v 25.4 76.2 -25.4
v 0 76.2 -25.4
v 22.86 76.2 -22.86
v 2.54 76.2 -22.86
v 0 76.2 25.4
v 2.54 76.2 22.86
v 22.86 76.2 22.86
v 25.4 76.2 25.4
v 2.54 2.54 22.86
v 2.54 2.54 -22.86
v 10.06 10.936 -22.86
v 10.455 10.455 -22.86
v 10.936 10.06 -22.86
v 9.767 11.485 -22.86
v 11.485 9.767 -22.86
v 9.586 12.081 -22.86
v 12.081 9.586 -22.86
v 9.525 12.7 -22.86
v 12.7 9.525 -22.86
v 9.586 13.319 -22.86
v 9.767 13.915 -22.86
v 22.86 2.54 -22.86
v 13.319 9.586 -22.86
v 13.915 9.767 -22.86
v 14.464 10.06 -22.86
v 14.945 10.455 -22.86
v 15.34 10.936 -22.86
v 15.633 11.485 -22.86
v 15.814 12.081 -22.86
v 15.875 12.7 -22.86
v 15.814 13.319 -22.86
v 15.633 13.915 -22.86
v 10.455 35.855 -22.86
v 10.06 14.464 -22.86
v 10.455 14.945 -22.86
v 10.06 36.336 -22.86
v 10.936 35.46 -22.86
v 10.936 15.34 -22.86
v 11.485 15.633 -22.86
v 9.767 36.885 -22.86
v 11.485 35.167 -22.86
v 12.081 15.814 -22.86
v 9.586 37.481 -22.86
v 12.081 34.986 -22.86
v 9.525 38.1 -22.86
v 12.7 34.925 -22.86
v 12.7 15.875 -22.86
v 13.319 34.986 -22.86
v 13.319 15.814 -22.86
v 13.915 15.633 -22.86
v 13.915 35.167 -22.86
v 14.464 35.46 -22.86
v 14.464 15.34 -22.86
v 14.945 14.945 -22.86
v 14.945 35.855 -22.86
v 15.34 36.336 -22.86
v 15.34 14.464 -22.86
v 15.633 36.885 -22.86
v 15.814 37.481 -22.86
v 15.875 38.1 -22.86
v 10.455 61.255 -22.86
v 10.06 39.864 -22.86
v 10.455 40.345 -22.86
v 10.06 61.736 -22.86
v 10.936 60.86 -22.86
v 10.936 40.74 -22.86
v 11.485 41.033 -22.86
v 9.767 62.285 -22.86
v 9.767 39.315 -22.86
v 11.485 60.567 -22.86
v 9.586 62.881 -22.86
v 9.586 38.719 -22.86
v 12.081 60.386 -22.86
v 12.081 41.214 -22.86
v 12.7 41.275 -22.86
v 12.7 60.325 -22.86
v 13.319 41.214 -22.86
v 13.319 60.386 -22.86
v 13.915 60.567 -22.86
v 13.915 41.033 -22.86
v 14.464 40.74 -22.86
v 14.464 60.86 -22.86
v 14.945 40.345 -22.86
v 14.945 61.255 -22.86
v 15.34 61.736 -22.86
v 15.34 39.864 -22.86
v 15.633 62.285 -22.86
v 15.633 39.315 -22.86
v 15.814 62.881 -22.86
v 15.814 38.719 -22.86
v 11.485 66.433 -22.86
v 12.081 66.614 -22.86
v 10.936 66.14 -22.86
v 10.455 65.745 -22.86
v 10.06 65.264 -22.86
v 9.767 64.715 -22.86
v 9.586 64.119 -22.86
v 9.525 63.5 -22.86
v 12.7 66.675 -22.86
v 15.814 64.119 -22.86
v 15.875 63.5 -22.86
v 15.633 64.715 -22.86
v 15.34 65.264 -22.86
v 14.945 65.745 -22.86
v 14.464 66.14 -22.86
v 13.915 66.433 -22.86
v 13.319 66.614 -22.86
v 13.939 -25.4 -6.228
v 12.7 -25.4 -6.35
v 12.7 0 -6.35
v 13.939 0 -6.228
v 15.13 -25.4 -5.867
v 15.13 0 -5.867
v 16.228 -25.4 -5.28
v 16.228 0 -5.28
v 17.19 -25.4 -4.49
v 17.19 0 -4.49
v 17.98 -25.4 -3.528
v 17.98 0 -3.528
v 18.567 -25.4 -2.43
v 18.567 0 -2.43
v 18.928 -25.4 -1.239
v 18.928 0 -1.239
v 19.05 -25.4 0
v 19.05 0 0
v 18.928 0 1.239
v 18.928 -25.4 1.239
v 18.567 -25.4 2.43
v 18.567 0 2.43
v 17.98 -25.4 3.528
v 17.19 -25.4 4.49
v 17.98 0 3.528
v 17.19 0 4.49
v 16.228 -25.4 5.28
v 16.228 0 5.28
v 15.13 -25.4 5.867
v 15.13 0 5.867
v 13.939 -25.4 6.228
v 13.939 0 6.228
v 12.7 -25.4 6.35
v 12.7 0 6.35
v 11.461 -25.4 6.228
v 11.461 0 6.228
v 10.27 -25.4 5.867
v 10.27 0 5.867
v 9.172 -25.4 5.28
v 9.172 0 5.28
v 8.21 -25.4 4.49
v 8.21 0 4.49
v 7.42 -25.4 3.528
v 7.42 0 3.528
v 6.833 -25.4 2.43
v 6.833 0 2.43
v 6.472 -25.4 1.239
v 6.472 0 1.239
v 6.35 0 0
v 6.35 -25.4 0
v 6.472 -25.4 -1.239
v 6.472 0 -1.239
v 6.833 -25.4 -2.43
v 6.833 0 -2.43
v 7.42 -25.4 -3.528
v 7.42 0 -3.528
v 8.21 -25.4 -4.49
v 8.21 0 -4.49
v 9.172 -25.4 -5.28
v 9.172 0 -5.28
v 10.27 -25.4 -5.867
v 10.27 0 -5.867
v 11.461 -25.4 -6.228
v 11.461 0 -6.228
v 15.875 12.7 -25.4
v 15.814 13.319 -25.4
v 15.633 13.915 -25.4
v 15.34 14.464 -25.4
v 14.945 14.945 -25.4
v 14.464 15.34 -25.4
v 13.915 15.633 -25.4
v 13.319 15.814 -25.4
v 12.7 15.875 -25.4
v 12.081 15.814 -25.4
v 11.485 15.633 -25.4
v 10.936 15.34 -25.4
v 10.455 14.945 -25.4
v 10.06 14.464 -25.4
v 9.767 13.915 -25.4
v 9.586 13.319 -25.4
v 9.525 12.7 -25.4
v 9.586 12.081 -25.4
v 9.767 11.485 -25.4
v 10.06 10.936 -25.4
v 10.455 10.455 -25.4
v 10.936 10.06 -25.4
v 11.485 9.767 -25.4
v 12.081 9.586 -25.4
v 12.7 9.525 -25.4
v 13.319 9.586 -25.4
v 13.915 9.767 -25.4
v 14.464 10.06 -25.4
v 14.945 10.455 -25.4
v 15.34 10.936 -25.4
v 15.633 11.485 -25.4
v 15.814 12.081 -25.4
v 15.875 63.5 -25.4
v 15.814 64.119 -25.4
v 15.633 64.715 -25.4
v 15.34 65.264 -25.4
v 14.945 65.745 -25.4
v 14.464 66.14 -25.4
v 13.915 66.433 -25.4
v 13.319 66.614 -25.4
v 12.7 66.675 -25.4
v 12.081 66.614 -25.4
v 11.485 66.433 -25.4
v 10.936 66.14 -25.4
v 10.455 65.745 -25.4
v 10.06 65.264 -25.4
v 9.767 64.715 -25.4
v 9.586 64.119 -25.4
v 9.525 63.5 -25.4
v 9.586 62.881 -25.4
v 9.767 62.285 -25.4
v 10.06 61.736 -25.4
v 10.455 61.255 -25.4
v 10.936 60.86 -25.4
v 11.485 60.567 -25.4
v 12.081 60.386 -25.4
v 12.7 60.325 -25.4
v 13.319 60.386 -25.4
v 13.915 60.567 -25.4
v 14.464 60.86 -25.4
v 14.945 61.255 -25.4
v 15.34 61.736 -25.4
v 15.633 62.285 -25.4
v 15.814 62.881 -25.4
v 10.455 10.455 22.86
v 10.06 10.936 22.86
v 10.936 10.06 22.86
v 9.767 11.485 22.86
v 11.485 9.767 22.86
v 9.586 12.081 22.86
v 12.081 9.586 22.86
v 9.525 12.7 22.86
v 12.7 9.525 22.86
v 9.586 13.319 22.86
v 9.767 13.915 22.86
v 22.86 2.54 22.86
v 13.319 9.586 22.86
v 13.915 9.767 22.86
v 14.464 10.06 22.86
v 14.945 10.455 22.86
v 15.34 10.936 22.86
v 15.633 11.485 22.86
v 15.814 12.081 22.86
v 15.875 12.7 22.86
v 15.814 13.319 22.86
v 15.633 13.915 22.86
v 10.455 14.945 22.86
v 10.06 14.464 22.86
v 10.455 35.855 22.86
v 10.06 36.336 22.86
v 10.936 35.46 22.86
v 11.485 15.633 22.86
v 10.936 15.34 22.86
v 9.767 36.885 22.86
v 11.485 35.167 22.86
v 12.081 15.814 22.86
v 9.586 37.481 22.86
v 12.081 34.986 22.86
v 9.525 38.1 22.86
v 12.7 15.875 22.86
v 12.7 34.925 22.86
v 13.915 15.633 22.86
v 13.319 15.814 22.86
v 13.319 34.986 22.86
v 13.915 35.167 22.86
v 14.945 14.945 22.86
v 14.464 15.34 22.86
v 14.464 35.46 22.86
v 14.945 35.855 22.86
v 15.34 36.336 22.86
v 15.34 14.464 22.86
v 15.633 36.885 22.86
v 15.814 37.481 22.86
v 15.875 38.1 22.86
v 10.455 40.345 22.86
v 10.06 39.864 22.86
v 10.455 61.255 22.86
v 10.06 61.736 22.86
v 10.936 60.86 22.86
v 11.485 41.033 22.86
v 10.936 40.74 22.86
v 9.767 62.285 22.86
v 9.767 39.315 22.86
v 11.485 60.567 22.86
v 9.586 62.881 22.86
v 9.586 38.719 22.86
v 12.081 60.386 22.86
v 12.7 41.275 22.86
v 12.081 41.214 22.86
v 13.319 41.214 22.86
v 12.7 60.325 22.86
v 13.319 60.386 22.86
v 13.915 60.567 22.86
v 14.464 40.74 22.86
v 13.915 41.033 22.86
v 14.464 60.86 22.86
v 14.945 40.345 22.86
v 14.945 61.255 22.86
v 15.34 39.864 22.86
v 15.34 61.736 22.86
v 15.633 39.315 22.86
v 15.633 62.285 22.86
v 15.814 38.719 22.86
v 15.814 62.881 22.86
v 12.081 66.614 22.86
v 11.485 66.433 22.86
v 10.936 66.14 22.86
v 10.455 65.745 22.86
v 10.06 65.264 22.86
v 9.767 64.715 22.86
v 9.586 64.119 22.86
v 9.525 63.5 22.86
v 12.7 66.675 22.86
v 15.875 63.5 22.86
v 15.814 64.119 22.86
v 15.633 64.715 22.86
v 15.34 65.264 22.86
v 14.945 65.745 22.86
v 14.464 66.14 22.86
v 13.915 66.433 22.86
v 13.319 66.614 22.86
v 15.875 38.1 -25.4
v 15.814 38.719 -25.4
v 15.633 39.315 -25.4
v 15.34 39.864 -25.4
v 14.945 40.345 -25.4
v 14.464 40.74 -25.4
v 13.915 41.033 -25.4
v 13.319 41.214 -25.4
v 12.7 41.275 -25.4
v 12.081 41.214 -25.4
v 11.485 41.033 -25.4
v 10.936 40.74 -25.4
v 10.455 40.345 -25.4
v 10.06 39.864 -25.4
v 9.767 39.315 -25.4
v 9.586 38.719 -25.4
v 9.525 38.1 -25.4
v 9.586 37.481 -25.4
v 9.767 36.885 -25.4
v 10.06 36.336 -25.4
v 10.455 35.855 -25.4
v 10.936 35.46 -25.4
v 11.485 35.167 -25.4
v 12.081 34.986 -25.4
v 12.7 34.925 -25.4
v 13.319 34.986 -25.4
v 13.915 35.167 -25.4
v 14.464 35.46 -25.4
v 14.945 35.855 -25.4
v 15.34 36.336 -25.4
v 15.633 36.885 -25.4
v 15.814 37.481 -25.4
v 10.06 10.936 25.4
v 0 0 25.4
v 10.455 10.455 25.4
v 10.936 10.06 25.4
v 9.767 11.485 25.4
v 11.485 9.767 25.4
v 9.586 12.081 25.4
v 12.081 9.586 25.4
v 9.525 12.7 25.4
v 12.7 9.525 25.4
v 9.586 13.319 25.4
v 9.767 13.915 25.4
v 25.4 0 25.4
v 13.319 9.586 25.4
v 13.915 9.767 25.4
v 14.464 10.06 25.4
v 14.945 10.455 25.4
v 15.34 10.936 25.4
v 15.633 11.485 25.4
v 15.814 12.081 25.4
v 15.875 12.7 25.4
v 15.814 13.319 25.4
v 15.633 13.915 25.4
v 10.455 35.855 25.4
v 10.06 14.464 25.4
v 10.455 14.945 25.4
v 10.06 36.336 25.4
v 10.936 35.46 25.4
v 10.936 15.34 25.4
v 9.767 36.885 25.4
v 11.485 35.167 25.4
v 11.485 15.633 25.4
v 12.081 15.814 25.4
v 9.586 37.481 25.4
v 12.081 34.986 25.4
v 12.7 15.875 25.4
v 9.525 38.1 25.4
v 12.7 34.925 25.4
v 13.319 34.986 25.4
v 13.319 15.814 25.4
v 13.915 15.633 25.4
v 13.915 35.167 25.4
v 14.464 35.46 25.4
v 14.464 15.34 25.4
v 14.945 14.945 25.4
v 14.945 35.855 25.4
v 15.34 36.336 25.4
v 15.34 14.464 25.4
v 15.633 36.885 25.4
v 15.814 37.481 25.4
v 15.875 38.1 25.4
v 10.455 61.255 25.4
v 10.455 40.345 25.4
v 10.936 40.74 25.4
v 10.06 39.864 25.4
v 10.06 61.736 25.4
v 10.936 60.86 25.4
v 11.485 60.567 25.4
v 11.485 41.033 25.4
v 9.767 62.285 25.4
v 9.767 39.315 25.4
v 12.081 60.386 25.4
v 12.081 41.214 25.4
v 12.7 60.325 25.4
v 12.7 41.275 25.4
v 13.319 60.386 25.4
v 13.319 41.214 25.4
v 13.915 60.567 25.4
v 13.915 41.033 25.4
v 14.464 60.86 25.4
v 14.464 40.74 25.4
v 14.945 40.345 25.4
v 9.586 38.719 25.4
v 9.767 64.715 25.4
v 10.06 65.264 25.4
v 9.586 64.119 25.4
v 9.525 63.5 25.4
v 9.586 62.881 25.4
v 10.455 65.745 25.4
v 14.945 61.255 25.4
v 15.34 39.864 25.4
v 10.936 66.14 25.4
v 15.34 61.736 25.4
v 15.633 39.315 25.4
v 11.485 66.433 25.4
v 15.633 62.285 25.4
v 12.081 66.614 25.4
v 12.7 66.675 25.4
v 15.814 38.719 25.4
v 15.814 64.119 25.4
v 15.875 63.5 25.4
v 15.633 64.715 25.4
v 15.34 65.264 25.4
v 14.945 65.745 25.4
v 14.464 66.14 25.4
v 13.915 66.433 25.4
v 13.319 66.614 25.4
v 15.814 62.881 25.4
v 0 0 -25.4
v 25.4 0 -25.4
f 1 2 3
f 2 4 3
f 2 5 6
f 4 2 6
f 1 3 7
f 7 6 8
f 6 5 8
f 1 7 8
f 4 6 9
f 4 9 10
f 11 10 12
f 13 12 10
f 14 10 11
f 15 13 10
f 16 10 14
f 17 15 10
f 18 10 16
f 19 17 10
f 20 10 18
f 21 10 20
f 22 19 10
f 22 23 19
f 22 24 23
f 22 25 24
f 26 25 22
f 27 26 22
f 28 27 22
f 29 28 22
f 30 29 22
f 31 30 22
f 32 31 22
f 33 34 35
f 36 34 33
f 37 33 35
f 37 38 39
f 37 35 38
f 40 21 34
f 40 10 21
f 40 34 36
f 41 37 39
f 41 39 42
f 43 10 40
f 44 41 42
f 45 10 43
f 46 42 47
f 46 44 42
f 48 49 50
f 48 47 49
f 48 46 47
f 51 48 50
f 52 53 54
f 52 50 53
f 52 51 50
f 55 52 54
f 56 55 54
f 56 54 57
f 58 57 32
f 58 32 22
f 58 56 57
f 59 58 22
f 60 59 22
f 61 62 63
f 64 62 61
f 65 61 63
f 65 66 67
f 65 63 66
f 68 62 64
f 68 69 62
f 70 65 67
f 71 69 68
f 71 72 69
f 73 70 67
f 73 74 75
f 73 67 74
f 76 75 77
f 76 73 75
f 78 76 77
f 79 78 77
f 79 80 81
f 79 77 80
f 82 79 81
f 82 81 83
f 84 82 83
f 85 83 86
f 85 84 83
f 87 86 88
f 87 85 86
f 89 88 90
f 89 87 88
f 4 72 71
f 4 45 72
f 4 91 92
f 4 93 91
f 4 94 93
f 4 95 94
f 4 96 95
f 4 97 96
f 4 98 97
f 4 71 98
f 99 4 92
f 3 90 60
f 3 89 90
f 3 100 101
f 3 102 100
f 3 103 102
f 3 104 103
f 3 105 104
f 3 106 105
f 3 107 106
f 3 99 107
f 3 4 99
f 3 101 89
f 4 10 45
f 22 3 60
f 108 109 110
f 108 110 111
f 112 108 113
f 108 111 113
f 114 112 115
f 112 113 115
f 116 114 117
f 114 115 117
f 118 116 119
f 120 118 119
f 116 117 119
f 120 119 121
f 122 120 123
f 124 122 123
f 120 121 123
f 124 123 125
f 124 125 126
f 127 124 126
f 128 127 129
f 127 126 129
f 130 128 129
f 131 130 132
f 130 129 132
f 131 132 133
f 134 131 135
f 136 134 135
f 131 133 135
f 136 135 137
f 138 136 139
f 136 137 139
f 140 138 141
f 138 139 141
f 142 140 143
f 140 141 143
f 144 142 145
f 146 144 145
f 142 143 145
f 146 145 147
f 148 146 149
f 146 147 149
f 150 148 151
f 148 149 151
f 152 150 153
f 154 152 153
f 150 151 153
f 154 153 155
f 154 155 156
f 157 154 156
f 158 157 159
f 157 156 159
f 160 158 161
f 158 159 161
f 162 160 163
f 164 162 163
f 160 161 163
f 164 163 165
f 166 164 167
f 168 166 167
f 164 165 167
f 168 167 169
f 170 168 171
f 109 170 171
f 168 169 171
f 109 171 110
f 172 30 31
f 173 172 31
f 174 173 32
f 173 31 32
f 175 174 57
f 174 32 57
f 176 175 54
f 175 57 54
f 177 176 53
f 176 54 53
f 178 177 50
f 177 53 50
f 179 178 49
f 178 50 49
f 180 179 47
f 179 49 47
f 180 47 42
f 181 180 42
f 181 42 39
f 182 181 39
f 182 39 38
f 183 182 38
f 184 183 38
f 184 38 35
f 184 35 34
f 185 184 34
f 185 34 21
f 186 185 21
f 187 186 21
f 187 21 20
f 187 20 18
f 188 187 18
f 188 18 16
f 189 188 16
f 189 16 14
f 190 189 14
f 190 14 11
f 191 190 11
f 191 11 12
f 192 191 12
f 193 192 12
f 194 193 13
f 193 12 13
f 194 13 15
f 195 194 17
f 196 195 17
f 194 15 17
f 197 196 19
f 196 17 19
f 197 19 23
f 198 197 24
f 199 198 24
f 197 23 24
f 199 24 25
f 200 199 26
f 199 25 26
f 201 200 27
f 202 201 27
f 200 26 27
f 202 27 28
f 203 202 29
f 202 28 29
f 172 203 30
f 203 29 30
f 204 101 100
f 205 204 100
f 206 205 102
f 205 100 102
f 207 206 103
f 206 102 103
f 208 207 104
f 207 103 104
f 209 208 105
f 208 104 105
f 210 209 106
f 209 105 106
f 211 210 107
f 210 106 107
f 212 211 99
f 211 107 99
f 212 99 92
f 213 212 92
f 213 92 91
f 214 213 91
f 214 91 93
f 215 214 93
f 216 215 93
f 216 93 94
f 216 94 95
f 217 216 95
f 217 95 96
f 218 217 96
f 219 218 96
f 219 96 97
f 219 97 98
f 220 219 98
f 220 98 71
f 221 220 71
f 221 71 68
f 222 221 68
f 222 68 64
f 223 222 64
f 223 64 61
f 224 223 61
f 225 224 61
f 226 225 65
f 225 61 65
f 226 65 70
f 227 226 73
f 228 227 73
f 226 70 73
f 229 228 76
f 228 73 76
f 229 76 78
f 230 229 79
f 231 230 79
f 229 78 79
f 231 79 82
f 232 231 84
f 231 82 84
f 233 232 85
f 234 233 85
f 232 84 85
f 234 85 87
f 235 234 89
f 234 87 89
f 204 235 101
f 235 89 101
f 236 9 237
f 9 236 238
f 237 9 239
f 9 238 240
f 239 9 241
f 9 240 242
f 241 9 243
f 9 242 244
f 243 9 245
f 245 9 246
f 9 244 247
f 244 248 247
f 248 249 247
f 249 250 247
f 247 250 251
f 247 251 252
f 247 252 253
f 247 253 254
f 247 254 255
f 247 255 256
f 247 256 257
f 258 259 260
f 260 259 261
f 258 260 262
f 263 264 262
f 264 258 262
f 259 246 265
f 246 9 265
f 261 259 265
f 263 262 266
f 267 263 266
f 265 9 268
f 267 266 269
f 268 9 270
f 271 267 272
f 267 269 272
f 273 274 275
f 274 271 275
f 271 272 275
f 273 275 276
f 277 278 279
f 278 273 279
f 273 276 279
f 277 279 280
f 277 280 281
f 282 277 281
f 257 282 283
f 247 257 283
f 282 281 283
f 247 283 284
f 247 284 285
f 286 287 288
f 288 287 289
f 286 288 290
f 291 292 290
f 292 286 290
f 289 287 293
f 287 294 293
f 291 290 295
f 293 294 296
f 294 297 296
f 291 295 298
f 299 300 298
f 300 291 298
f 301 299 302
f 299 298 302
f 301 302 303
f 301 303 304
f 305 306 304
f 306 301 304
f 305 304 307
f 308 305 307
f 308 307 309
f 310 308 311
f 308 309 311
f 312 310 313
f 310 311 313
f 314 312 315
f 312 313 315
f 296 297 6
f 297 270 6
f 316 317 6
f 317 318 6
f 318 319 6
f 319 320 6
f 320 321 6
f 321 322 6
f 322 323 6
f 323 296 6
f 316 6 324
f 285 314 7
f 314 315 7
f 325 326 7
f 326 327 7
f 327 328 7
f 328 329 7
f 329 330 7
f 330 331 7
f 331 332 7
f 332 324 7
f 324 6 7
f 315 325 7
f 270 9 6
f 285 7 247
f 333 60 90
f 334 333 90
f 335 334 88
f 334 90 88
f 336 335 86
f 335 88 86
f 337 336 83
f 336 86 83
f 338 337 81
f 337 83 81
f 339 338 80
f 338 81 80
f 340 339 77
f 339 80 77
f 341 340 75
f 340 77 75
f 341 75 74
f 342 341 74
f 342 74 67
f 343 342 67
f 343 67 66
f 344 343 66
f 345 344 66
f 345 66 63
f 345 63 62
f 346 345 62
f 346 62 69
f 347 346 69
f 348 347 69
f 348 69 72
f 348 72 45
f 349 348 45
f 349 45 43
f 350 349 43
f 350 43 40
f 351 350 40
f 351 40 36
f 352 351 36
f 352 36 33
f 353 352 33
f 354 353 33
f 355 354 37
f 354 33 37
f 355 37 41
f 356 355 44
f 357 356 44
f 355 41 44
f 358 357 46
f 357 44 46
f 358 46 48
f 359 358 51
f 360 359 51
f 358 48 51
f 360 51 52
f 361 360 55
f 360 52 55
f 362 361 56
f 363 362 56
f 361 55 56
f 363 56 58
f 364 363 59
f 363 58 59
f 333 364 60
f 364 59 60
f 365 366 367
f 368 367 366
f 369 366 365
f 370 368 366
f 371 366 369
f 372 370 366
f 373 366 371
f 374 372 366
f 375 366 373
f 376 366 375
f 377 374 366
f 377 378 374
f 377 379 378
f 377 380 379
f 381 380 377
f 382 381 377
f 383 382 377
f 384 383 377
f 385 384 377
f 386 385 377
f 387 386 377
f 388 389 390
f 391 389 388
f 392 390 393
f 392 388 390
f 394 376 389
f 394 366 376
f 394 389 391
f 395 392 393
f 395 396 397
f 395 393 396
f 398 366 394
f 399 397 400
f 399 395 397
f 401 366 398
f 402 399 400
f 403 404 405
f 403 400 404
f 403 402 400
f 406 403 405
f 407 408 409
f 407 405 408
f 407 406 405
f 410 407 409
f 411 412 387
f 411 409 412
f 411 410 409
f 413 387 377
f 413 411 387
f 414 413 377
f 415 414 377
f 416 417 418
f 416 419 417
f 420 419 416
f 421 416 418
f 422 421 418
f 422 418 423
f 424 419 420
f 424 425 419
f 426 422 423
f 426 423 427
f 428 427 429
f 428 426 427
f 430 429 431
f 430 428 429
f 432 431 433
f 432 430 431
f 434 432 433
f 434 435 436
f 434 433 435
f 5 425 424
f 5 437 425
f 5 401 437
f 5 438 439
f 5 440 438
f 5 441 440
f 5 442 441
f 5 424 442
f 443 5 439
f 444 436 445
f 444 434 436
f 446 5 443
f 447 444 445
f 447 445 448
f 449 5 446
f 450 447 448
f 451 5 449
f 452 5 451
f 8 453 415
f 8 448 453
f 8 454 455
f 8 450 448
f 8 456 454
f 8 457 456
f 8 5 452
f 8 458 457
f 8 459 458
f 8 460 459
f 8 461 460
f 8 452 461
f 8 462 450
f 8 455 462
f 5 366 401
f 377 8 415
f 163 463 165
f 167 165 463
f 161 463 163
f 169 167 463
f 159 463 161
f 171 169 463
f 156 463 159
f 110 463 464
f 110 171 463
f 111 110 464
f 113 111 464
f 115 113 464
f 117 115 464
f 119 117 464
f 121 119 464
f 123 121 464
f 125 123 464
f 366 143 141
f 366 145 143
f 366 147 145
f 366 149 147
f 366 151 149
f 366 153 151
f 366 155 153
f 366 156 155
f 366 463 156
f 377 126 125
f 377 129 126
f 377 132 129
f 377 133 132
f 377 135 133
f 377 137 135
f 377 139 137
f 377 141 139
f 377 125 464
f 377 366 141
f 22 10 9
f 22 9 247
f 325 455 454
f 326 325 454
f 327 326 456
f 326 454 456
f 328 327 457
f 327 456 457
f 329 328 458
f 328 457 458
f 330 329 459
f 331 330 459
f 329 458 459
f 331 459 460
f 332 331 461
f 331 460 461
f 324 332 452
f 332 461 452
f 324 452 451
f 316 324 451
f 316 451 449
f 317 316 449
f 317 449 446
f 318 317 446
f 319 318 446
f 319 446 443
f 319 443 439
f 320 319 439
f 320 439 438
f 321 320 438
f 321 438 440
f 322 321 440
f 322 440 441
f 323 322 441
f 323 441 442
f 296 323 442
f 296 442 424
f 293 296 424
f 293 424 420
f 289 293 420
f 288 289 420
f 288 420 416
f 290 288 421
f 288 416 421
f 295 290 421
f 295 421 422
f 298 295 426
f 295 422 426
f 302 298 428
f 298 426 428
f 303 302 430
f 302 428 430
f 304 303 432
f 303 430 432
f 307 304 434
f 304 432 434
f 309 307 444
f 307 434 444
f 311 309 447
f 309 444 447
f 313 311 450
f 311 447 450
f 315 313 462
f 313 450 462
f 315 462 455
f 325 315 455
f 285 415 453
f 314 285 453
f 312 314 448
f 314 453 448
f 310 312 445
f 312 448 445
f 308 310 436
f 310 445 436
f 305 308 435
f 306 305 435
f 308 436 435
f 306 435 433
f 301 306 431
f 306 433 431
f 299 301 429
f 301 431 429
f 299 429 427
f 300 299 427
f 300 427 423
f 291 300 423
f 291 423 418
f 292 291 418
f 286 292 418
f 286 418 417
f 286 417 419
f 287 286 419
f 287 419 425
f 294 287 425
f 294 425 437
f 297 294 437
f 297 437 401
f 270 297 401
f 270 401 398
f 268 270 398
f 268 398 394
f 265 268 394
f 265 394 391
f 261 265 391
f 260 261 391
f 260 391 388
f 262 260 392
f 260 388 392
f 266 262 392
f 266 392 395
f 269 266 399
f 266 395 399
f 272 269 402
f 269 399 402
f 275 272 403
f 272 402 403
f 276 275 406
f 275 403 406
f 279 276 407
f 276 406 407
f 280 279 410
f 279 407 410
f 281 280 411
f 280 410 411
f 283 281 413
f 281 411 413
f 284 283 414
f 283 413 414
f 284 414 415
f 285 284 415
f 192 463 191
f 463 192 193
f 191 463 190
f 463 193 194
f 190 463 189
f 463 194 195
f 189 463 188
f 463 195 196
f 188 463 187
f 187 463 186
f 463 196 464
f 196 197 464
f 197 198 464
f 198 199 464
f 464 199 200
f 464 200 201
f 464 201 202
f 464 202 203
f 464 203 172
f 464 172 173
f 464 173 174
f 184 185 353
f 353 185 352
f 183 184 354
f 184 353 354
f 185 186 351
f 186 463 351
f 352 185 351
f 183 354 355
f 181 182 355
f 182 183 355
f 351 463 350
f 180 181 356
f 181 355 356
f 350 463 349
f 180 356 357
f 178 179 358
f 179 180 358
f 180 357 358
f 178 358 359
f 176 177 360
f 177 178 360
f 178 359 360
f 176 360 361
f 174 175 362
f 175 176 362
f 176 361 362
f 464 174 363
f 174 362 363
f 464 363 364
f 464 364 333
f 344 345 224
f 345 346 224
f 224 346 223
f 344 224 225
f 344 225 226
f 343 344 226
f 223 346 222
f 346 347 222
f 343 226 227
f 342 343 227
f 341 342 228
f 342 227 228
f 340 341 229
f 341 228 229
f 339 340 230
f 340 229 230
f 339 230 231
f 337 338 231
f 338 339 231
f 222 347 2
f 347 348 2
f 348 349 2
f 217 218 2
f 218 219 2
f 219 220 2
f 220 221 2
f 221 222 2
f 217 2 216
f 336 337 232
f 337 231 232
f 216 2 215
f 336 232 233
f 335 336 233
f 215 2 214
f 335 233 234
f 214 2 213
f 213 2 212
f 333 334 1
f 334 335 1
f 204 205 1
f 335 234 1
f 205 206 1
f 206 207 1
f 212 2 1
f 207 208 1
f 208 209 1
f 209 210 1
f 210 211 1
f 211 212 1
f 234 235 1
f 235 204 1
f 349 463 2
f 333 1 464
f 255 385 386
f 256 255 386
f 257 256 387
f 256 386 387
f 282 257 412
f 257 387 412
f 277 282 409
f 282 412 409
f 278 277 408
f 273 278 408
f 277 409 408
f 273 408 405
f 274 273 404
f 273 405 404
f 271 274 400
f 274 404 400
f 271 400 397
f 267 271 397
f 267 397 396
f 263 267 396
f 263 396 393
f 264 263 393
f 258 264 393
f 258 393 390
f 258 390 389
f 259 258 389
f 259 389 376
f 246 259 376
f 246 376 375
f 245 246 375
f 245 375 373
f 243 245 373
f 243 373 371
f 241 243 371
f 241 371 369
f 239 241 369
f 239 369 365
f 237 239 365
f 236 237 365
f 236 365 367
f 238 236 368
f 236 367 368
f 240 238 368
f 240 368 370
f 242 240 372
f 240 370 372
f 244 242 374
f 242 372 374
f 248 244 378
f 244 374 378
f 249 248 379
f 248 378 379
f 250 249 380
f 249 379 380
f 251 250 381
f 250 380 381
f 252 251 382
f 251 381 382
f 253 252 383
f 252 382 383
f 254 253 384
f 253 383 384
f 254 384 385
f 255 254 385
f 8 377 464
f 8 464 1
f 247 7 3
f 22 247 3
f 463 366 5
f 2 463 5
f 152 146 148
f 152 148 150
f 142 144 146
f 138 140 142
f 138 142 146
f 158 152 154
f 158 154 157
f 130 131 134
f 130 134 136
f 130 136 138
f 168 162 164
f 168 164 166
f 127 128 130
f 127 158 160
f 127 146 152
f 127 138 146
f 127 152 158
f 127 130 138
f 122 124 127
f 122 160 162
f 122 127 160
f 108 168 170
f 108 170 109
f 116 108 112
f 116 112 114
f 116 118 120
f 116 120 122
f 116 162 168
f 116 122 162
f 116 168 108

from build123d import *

# Parameters (mm, degrees)
SKETCH1_W           = 25.4
SKETCH1_H           = 76.2
BOSS_EXTRUDE1_DEPTH = 25.4
SKETCH2_R           = 3.175
CUT_EXTRUDE1_DEPTH  = 96.038097624
SKETCH3_W           = 20.32
SKETCH3_H           = 45.72
CUT_EXTRUDE2_DEPTH  = 73.66
SKETCH4_R           = 6.35
BOSS_EXTRUDE2_DEPTH = 25.4


with BuildPart() as part:
    # Sketch1 → Boss-Extrude1 (new, symmetric)
    with BuildSketch(Plane.XY):
        with Locations((12.7, 38.1)):
            Rectangle(SKETCH1_W, SKETCH1_H)
    extrude(amount=BOSS_EXTRUDE1_DEPTH, both=True)

    # Sketch2 → Cut-Extrude1 (cut, through all)
    with BuildSketch(Plane.XY.offset(25.4)):
        with Locations((12.7, 38.1)):
            Circle(SKETCH2_R)
        with Locations((12.7, 63.5)):
            Circle(SKETCH2_R)
        with Locations((12.7, 88.9)):
            Circle(SKETCH2_R)
        with Locations((12.7, 12.7)):
            Circle(SKETCH2_R)
    extrude(amount=-CUT_EXTRUDE1_DEPTH, mode=Mode.SUBTRACT)

    # Sketch3 → Cut-Extrude2 (cut)
    with BuildSketch(Plane(origin=(0, 76.2, 0), x_dir=(1, 0, 0), z_dir=(0, 1, 0))):
        with Locations((12.7, 0)):
            Rectangle(SKETCH3_W, SKETCH3_H)
    extrude(amount=-CUT_EXTRUDE2_DEPTH, mode=Mode.SUBTRACT)

    # Sketch4 → Boss-Extrude2 (add)
    with BuildSketch(Plane.XZ):
        with Locations(Location((12.7, 0, 0), (0, 0, 270))):
            Circle(SKETCH4_R)
    extrude(amount=BOSS_EXTRUDE2_DEPTH)


solid = part.part
